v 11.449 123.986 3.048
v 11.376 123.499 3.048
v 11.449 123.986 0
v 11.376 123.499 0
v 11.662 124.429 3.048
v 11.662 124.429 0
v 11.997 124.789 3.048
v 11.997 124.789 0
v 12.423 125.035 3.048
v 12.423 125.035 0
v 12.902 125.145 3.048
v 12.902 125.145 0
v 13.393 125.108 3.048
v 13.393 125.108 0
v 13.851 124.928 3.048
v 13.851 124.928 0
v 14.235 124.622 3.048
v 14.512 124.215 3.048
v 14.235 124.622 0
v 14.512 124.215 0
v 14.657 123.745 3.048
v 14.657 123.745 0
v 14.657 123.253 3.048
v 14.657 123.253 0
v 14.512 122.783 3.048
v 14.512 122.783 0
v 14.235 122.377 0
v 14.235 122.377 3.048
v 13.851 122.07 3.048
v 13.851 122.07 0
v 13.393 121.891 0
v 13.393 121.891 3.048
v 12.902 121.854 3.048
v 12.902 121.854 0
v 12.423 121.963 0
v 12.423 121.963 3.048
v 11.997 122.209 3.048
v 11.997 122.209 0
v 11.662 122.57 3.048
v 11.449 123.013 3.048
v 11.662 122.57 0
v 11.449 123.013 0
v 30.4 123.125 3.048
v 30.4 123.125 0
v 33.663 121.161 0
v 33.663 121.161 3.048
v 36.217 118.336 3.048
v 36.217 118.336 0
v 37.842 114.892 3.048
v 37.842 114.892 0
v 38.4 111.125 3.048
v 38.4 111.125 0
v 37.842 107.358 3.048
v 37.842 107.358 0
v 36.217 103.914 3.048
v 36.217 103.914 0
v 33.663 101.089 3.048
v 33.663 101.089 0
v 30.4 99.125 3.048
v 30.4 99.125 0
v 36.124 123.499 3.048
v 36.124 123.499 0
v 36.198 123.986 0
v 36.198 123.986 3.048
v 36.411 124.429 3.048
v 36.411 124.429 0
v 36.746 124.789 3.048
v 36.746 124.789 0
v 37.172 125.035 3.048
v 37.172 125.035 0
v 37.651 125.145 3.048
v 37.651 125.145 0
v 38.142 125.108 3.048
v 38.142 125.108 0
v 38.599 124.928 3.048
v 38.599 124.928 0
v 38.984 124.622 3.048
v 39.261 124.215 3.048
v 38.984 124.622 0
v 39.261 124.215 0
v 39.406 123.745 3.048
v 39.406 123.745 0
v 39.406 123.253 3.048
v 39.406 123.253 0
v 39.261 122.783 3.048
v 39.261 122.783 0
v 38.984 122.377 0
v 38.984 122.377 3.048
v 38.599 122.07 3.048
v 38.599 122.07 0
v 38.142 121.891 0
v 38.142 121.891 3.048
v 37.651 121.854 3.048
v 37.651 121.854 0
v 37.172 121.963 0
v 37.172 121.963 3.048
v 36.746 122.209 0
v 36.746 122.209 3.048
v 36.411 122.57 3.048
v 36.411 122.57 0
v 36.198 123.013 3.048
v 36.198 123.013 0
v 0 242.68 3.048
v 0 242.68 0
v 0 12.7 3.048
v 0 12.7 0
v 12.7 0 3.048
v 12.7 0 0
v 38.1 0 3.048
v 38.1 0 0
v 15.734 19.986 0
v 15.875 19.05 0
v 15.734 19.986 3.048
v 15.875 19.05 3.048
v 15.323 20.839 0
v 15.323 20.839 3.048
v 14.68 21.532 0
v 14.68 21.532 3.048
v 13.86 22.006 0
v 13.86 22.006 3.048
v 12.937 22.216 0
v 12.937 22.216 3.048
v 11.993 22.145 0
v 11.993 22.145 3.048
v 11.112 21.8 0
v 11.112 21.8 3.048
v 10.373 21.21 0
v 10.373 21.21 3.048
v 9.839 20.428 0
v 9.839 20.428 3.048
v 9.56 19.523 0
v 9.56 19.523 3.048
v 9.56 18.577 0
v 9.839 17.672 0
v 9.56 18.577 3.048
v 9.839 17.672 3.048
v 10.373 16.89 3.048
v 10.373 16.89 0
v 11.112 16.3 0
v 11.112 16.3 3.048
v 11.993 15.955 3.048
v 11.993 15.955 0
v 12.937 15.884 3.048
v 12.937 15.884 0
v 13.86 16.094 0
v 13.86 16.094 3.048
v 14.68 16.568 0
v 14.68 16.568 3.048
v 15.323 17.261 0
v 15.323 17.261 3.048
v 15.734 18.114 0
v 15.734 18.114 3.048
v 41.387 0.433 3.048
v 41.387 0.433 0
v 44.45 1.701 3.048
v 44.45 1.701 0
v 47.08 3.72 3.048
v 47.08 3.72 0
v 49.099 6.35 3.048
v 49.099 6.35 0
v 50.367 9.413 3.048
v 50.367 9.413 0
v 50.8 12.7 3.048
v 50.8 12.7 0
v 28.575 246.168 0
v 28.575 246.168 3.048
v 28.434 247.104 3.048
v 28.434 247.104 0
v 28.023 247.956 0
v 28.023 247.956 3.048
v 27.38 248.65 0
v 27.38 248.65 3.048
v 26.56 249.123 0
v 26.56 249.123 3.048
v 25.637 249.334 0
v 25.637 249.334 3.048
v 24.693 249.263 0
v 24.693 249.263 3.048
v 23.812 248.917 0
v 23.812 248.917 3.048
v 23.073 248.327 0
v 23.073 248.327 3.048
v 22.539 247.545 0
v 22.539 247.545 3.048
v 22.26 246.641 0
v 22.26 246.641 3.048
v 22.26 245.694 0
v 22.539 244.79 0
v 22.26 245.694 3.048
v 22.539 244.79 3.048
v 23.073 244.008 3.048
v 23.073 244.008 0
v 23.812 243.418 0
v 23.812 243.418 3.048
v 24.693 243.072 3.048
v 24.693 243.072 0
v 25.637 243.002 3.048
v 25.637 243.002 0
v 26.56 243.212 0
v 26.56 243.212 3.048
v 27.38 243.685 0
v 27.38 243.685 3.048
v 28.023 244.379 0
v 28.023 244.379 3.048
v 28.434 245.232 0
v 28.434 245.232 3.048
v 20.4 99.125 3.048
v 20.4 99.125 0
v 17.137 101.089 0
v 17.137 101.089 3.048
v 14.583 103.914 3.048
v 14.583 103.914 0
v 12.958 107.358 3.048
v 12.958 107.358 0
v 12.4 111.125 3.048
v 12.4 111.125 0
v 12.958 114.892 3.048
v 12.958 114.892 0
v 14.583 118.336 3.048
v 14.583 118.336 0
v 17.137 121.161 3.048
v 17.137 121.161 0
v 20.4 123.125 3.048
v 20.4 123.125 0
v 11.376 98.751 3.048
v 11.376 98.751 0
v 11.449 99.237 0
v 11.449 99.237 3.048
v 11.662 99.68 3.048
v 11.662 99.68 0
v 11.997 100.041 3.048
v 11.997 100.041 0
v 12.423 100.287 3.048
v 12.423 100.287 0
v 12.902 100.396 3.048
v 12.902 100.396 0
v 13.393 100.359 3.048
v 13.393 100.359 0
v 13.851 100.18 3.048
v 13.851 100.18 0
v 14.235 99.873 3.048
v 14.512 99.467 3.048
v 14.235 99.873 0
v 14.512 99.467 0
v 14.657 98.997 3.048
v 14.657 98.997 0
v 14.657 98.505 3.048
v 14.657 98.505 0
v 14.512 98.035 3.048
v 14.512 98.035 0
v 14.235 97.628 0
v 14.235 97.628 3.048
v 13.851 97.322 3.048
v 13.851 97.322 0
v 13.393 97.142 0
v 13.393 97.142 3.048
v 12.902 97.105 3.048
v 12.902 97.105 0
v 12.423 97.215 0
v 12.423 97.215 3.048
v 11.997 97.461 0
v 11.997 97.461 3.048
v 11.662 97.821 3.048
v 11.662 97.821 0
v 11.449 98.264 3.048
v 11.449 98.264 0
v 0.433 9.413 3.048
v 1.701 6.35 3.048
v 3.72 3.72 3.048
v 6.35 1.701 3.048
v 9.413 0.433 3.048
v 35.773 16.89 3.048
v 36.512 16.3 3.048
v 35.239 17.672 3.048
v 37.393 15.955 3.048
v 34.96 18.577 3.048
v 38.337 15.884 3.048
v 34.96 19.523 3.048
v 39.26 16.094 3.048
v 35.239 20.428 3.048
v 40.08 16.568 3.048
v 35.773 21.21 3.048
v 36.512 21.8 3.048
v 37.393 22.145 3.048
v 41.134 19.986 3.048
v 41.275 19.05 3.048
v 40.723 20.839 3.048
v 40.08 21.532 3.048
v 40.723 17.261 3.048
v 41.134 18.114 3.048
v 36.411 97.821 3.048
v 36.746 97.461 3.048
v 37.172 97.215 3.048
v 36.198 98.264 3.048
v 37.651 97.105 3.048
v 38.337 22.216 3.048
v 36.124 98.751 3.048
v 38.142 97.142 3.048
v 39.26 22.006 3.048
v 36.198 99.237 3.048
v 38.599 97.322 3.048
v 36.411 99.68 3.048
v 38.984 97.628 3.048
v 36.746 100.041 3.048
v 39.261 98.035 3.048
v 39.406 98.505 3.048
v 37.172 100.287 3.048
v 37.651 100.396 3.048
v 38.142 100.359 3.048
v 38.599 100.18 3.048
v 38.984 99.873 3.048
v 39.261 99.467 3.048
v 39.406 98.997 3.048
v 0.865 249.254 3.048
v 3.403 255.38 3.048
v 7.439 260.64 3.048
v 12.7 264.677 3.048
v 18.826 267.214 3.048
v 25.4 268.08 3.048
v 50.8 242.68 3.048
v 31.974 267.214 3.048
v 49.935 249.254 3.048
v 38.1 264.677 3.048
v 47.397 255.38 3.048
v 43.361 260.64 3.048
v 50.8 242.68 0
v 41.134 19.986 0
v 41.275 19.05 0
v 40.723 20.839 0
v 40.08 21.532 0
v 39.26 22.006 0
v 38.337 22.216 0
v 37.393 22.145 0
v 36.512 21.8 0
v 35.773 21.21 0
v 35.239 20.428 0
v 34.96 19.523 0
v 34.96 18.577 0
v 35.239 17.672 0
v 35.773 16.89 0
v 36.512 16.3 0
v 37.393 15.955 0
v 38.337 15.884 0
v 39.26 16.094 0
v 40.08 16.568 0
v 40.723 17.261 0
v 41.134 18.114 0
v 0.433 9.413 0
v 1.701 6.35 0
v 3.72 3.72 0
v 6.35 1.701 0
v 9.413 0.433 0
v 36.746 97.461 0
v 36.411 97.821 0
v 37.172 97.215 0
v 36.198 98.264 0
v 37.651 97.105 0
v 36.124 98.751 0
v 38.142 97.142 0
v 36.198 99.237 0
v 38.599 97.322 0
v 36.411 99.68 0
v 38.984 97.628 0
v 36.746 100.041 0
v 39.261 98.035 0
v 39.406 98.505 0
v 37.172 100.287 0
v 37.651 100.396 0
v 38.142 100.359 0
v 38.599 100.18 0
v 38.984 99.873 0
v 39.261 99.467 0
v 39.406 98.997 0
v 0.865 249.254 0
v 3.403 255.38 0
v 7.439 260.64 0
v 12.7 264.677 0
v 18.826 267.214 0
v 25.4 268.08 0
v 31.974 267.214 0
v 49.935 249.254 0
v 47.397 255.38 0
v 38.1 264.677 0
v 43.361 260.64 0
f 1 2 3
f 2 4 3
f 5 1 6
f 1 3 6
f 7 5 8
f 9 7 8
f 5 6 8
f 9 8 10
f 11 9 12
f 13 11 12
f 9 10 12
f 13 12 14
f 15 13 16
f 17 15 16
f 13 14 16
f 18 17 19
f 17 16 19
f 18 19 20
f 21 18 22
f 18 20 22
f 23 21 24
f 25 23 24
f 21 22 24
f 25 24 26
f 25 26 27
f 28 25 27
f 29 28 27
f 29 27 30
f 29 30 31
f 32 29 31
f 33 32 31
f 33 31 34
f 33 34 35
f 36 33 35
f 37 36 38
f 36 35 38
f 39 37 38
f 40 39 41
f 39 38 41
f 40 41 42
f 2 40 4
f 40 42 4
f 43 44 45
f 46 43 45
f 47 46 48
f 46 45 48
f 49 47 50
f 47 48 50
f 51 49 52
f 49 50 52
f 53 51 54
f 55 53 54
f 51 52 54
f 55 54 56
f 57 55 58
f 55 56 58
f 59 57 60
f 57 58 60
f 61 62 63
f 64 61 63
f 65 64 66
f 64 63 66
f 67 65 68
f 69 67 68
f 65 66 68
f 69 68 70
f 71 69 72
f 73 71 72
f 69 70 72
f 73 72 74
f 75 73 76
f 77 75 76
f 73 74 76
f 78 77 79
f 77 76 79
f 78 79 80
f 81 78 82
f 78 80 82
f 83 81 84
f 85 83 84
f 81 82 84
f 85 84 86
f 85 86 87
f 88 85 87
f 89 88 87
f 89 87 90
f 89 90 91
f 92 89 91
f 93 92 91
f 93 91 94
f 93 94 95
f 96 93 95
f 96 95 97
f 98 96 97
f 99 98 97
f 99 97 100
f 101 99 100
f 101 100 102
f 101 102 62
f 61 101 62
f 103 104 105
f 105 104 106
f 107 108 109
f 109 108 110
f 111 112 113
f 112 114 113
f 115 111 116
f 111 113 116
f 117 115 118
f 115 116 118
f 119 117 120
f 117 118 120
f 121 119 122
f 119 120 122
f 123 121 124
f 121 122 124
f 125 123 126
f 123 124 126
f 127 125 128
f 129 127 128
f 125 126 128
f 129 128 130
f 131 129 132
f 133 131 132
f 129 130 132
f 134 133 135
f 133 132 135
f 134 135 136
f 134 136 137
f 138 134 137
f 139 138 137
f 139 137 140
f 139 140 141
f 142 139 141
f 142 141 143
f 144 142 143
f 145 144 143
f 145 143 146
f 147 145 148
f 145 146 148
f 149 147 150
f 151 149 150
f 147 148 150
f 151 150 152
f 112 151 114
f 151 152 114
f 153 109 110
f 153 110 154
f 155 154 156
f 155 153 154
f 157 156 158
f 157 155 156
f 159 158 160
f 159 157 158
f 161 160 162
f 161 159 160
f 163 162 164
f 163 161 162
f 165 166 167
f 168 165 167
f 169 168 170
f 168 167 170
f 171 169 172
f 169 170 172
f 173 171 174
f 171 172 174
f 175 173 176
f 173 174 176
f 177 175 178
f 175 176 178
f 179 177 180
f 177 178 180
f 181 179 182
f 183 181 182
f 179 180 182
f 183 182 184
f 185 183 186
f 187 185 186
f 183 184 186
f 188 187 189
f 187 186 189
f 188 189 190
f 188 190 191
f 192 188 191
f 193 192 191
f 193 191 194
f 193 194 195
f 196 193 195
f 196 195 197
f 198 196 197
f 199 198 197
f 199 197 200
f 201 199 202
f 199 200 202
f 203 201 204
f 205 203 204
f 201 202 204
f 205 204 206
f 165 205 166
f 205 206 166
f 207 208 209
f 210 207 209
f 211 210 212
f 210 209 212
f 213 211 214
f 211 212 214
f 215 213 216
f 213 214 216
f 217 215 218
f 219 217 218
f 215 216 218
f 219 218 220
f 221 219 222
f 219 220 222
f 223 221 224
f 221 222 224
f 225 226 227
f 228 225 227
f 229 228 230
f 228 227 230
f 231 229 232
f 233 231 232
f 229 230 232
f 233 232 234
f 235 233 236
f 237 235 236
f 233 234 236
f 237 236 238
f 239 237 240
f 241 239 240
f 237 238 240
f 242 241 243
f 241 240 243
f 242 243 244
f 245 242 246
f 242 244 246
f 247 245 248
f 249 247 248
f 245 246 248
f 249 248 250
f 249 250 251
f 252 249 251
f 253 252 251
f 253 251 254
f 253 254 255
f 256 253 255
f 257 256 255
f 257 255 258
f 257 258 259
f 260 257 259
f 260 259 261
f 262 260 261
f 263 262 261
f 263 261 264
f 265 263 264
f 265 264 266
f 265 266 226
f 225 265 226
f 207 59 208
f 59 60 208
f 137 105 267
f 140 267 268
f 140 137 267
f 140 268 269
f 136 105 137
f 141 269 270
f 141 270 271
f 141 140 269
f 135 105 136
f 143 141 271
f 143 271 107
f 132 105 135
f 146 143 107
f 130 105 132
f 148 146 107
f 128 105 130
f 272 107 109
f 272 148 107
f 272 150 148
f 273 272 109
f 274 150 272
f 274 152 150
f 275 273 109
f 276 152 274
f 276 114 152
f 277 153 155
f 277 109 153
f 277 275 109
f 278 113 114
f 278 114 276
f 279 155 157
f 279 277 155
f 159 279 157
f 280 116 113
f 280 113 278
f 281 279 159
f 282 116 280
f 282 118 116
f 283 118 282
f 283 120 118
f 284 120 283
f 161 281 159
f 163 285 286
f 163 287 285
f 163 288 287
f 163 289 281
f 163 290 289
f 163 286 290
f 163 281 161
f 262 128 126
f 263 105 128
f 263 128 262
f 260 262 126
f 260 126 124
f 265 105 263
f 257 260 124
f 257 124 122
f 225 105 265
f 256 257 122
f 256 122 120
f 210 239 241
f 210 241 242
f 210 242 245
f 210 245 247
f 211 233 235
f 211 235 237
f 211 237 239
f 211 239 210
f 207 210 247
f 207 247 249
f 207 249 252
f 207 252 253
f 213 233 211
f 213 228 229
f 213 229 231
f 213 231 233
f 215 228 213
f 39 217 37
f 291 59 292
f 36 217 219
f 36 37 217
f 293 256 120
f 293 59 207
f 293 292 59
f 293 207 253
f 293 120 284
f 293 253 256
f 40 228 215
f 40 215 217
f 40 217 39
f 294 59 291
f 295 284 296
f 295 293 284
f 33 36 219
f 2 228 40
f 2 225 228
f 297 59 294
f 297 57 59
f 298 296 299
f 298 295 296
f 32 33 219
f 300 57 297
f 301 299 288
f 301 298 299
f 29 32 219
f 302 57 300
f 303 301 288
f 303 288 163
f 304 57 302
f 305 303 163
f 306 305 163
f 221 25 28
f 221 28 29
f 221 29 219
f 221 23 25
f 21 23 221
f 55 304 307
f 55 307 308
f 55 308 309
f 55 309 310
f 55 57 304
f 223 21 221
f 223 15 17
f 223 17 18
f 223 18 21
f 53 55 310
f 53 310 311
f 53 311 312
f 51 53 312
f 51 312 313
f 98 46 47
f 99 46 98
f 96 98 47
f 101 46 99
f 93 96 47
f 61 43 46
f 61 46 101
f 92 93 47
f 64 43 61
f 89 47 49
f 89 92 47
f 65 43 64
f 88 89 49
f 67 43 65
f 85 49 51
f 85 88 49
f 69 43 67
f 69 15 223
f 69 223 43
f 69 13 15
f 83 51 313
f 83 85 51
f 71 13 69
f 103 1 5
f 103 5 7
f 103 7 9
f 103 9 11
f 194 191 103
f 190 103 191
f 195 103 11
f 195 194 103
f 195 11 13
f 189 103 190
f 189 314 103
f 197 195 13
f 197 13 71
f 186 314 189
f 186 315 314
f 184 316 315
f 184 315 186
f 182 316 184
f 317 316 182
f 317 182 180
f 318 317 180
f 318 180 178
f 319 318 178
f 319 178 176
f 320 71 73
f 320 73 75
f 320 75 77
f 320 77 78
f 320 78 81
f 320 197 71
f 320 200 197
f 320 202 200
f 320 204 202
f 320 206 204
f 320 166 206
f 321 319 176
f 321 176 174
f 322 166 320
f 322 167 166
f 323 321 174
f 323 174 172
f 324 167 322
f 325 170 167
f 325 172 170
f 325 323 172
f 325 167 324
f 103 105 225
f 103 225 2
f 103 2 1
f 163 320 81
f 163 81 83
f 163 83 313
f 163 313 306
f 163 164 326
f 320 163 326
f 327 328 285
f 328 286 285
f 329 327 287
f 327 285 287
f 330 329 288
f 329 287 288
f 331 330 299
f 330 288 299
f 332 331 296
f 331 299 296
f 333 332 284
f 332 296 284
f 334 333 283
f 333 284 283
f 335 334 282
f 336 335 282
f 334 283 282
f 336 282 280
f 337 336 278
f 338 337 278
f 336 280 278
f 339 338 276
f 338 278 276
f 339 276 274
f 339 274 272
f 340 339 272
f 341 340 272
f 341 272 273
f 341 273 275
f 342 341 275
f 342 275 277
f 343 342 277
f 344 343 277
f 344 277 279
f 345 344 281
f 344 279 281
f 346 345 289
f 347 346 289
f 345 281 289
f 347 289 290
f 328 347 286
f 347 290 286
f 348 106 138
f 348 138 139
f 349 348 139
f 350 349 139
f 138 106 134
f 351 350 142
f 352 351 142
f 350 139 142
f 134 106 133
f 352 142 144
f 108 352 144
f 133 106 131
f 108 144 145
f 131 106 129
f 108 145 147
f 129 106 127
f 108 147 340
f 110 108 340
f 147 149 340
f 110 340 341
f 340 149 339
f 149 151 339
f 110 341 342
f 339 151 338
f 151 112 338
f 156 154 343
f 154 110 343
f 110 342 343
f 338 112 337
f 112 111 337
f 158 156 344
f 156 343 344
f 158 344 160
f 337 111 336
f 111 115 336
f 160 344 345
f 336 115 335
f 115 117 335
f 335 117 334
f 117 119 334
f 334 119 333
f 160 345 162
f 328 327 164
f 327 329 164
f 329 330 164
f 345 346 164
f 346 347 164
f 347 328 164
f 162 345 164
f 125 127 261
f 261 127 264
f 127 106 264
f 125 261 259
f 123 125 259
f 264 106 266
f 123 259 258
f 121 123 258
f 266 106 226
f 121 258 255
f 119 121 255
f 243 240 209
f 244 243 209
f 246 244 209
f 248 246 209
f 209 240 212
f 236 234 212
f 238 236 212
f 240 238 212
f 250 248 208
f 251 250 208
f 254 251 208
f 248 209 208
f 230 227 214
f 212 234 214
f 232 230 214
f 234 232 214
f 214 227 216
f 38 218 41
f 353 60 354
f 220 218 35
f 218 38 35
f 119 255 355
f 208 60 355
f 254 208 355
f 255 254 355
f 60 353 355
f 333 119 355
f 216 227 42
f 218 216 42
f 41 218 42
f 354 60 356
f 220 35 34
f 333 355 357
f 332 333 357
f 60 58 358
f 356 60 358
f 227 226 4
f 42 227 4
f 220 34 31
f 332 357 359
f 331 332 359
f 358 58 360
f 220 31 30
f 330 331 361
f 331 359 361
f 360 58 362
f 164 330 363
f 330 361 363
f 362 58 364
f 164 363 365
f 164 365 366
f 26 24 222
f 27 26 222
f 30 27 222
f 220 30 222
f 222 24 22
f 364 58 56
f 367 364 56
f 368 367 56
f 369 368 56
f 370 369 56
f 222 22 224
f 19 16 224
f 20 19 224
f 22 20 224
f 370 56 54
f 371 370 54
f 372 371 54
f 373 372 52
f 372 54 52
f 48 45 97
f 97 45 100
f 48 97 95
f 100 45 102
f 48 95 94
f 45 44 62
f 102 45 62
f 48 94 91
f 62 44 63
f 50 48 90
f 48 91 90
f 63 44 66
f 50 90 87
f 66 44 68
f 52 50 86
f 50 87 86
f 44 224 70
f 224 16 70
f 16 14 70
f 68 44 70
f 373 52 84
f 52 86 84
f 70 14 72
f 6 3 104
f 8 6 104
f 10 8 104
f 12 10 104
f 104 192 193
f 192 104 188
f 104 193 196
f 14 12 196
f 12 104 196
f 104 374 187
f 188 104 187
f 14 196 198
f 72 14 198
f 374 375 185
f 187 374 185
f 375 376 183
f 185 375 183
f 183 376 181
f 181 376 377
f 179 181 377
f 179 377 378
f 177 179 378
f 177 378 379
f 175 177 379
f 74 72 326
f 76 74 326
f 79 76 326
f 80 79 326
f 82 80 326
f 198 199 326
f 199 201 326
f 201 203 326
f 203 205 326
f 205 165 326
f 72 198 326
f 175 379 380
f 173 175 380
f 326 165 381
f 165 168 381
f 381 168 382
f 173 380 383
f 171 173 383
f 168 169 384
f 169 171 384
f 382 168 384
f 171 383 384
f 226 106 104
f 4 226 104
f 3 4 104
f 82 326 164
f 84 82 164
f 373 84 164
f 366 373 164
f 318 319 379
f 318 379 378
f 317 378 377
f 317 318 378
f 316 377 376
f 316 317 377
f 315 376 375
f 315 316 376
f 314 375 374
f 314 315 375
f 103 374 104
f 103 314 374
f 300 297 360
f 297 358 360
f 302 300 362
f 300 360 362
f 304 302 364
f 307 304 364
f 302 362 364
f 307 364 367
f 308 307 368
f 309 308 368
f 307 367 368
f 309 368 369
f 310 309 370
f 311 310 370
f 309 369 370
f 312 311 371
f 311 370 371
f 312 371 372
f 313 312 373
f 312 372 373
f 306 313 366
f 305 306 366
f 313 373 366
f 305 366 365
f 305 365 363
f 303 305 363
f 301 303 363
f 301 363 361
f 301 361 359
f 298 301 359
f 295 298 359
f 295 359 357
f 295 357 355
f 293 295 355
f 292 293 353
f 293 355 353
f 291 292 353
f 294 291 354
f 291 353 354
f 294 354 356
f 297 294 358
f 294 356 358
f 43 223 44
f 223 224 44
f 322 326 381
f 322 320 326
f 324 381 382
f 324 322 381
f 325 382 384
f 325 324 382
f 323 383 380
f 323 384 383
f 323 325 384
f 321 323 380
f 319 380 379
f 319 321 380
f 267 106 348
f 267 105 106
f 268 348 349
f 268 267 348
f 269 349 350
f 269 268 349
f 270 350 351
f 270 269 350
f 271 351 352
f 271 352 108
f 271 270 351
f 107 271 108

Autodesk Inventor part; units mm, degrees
ref_plane "YZ Plane" through (0, 0, 0) normal (1, 0, 0) x (0, 1, 0)
ref_plane "XZ Plane" through (0, 0, 0) normal (0, 1, 0) x (-1, 0, 0)
ref_plane "XY Plane" through (0, 0, 0) normal (0, 0, 1) x (1, 0, 0)
sketch "Sketch1" plane through (0, 0, 0) normal (0, 0, 1) x (1, 0, 0)
  line L0 (0, 0) -> (50.8, 0)
  line L1 (50.8, 0) -> (50.8, 27.1979)
  line L2 (50.8, 139.7) -> (0, 139.7) construction
  line L3 (0, 139.7) -> (0, 0)
  line L4 (128.6063, 161.9886) -> (104.1161, 68.3618)
  line L5 (418.4795, 73.9788) -> (-1.9313, 310.0684)
  arc A0 (104.1161, 68.3618) -> (50.8, 27.1979) centre (93.3487, 27.1979) ccw construction
  line L6 (128.6063, 161.9886) -> (145.6601, 227.1856)
  line L7 (63.1831, 62.4318) -> (91.6427, 171.2335) construction
  arc A1 (50.8, 139.7) -> (91.6427, 171.2335) centre (50.8, 181.9168) ccw
  line L8 (95.8188, 187.1988) -> (111.3222, 246.4687)
  line L9 (91.6427, 171.2335) -> (95.8188, 187.1988)
  line L10 (50.8, 27.1979) -> (50.8, 139.7)
  line L11 (417.0097, 172.2938) -> (-48.9451, 294.1693)
  line L12 (50.8, 139.7) -> (50.8, 268.0799)
  line L13 (50.8, 268.0799) -> (0, 268.0799)
  line L14 (0, 268.0799) -> (0, 139.7)
  dimension "d0" = 50.8
  dimension "d1" = 139.7
extrude "Plate1" add sketch "Sketch1" along normal blind 3.048 contours L3 L14 L13 L12 L10 L1 L0
fillet "Corner Round2" radius 12.7 2 edges at (50.8, 0, 1.524) (0, 0, 1.524)
sketch "Sketch2" plane through (0, 0, 0) normal (0, 0, -1) x (-1, 0, 0)
  arc A0 (-20.4, 99.125) -> (-20.4, 123.125) centre (-25.4, 111.125) ccw projected
  line L0 (-20.4, 123.125) -> (-30.4, 123.125) projected
  line L1 (-30.4, 99.125) -> (-20.4, 99.125) projected
  arc A1 (-30.4, 123.125) -> (-30.4, 99.125) centre (-25.4, 111.125) ccw projected
  circle A2 centre (-13.0256, 98.7506) radius 1.65 projected
  circle A3 centre (-37.7744, 123.4994) radius 1.65 projected
  circle A4 centre (-13.0256, 123.4994) radius 1.65 projected
  circle A5 centre (-37.7744, 98.7506) radius 1.65 projected
  point P0 (0, 0)
extrude "Extrusion1" cut sketch "Sketch2" against normal up to surface (3.048 mm away)
fillet "Corner Round4" radius 25.4 2 edges at (50.8, 268.0799, 1.524) (0, 268.0799, 1.524)
sketch "Sketch6" plane through (0, 0, 3.048) normal (0, 0, 1) x (1, 0, 0)
  line L0 (406.4, 135.7009) -> (-31.623, 262.7009) construction
  circle A0 centre (25.4, 246.1677) radius 3.175
  arc A1 (50.8, 242.6799) -> (0, 242.6799) centre (25.4, 242.6799) ccw projected
  point P0 (0, 0)
  dimension "d33" = 6.35
  dimension "d34" = 0
extrude "Extrusion4" cut sketch "Sketch6" against normal up to next
sketch "Sketch7" plane through (0, 0, 3.048) normal (0, 0, 1) x (1, 0, 0)
  circle A0 centre (12.7, 19.05) radius 3.175
  circle A1 centre (38.1, 19.05) radius 3.175
  line L0 (38.1, 0) -> (12.7, 0) projected
  line L1 (0, 12.7) -> (0, 242.6799) projected
  line L2 (50.8, 242.6799) -> (50.8, 12.7) projected
  point P0 (0, 0)
  dimension "d37" = 6.35
  dimension "d38" = 6.35
  dimension "d39" = 19.05
  dimension "d40" = 12.7
  dimension "d41" = 12.7
extrude "Extrusion5" cut sketch "Sketch7" against normal up to next
equation "\"d10\" = Thickness"
equation "\"BendRadius\" = Thickness"
equation "\"BendReliefWidth\" = Thickness"
equation "\"BendReliefDepth\" = 0.5 * Thickness"
equation "\"CornerReliefSize\" = 4 * Thickness"
equation "\"MinimumRemnant\" = 2 * Thickness"
equation "\"TransitionRadius\" = BendRadius"
equation "\"JacobiRadiusSize\" = Thickness"
equation "\"GapSize\" = Thickness"
equation "\"d2\" = BendRadius"
equation "\"Thickness\" = 3.048"
properties part number "pG188Mount"
